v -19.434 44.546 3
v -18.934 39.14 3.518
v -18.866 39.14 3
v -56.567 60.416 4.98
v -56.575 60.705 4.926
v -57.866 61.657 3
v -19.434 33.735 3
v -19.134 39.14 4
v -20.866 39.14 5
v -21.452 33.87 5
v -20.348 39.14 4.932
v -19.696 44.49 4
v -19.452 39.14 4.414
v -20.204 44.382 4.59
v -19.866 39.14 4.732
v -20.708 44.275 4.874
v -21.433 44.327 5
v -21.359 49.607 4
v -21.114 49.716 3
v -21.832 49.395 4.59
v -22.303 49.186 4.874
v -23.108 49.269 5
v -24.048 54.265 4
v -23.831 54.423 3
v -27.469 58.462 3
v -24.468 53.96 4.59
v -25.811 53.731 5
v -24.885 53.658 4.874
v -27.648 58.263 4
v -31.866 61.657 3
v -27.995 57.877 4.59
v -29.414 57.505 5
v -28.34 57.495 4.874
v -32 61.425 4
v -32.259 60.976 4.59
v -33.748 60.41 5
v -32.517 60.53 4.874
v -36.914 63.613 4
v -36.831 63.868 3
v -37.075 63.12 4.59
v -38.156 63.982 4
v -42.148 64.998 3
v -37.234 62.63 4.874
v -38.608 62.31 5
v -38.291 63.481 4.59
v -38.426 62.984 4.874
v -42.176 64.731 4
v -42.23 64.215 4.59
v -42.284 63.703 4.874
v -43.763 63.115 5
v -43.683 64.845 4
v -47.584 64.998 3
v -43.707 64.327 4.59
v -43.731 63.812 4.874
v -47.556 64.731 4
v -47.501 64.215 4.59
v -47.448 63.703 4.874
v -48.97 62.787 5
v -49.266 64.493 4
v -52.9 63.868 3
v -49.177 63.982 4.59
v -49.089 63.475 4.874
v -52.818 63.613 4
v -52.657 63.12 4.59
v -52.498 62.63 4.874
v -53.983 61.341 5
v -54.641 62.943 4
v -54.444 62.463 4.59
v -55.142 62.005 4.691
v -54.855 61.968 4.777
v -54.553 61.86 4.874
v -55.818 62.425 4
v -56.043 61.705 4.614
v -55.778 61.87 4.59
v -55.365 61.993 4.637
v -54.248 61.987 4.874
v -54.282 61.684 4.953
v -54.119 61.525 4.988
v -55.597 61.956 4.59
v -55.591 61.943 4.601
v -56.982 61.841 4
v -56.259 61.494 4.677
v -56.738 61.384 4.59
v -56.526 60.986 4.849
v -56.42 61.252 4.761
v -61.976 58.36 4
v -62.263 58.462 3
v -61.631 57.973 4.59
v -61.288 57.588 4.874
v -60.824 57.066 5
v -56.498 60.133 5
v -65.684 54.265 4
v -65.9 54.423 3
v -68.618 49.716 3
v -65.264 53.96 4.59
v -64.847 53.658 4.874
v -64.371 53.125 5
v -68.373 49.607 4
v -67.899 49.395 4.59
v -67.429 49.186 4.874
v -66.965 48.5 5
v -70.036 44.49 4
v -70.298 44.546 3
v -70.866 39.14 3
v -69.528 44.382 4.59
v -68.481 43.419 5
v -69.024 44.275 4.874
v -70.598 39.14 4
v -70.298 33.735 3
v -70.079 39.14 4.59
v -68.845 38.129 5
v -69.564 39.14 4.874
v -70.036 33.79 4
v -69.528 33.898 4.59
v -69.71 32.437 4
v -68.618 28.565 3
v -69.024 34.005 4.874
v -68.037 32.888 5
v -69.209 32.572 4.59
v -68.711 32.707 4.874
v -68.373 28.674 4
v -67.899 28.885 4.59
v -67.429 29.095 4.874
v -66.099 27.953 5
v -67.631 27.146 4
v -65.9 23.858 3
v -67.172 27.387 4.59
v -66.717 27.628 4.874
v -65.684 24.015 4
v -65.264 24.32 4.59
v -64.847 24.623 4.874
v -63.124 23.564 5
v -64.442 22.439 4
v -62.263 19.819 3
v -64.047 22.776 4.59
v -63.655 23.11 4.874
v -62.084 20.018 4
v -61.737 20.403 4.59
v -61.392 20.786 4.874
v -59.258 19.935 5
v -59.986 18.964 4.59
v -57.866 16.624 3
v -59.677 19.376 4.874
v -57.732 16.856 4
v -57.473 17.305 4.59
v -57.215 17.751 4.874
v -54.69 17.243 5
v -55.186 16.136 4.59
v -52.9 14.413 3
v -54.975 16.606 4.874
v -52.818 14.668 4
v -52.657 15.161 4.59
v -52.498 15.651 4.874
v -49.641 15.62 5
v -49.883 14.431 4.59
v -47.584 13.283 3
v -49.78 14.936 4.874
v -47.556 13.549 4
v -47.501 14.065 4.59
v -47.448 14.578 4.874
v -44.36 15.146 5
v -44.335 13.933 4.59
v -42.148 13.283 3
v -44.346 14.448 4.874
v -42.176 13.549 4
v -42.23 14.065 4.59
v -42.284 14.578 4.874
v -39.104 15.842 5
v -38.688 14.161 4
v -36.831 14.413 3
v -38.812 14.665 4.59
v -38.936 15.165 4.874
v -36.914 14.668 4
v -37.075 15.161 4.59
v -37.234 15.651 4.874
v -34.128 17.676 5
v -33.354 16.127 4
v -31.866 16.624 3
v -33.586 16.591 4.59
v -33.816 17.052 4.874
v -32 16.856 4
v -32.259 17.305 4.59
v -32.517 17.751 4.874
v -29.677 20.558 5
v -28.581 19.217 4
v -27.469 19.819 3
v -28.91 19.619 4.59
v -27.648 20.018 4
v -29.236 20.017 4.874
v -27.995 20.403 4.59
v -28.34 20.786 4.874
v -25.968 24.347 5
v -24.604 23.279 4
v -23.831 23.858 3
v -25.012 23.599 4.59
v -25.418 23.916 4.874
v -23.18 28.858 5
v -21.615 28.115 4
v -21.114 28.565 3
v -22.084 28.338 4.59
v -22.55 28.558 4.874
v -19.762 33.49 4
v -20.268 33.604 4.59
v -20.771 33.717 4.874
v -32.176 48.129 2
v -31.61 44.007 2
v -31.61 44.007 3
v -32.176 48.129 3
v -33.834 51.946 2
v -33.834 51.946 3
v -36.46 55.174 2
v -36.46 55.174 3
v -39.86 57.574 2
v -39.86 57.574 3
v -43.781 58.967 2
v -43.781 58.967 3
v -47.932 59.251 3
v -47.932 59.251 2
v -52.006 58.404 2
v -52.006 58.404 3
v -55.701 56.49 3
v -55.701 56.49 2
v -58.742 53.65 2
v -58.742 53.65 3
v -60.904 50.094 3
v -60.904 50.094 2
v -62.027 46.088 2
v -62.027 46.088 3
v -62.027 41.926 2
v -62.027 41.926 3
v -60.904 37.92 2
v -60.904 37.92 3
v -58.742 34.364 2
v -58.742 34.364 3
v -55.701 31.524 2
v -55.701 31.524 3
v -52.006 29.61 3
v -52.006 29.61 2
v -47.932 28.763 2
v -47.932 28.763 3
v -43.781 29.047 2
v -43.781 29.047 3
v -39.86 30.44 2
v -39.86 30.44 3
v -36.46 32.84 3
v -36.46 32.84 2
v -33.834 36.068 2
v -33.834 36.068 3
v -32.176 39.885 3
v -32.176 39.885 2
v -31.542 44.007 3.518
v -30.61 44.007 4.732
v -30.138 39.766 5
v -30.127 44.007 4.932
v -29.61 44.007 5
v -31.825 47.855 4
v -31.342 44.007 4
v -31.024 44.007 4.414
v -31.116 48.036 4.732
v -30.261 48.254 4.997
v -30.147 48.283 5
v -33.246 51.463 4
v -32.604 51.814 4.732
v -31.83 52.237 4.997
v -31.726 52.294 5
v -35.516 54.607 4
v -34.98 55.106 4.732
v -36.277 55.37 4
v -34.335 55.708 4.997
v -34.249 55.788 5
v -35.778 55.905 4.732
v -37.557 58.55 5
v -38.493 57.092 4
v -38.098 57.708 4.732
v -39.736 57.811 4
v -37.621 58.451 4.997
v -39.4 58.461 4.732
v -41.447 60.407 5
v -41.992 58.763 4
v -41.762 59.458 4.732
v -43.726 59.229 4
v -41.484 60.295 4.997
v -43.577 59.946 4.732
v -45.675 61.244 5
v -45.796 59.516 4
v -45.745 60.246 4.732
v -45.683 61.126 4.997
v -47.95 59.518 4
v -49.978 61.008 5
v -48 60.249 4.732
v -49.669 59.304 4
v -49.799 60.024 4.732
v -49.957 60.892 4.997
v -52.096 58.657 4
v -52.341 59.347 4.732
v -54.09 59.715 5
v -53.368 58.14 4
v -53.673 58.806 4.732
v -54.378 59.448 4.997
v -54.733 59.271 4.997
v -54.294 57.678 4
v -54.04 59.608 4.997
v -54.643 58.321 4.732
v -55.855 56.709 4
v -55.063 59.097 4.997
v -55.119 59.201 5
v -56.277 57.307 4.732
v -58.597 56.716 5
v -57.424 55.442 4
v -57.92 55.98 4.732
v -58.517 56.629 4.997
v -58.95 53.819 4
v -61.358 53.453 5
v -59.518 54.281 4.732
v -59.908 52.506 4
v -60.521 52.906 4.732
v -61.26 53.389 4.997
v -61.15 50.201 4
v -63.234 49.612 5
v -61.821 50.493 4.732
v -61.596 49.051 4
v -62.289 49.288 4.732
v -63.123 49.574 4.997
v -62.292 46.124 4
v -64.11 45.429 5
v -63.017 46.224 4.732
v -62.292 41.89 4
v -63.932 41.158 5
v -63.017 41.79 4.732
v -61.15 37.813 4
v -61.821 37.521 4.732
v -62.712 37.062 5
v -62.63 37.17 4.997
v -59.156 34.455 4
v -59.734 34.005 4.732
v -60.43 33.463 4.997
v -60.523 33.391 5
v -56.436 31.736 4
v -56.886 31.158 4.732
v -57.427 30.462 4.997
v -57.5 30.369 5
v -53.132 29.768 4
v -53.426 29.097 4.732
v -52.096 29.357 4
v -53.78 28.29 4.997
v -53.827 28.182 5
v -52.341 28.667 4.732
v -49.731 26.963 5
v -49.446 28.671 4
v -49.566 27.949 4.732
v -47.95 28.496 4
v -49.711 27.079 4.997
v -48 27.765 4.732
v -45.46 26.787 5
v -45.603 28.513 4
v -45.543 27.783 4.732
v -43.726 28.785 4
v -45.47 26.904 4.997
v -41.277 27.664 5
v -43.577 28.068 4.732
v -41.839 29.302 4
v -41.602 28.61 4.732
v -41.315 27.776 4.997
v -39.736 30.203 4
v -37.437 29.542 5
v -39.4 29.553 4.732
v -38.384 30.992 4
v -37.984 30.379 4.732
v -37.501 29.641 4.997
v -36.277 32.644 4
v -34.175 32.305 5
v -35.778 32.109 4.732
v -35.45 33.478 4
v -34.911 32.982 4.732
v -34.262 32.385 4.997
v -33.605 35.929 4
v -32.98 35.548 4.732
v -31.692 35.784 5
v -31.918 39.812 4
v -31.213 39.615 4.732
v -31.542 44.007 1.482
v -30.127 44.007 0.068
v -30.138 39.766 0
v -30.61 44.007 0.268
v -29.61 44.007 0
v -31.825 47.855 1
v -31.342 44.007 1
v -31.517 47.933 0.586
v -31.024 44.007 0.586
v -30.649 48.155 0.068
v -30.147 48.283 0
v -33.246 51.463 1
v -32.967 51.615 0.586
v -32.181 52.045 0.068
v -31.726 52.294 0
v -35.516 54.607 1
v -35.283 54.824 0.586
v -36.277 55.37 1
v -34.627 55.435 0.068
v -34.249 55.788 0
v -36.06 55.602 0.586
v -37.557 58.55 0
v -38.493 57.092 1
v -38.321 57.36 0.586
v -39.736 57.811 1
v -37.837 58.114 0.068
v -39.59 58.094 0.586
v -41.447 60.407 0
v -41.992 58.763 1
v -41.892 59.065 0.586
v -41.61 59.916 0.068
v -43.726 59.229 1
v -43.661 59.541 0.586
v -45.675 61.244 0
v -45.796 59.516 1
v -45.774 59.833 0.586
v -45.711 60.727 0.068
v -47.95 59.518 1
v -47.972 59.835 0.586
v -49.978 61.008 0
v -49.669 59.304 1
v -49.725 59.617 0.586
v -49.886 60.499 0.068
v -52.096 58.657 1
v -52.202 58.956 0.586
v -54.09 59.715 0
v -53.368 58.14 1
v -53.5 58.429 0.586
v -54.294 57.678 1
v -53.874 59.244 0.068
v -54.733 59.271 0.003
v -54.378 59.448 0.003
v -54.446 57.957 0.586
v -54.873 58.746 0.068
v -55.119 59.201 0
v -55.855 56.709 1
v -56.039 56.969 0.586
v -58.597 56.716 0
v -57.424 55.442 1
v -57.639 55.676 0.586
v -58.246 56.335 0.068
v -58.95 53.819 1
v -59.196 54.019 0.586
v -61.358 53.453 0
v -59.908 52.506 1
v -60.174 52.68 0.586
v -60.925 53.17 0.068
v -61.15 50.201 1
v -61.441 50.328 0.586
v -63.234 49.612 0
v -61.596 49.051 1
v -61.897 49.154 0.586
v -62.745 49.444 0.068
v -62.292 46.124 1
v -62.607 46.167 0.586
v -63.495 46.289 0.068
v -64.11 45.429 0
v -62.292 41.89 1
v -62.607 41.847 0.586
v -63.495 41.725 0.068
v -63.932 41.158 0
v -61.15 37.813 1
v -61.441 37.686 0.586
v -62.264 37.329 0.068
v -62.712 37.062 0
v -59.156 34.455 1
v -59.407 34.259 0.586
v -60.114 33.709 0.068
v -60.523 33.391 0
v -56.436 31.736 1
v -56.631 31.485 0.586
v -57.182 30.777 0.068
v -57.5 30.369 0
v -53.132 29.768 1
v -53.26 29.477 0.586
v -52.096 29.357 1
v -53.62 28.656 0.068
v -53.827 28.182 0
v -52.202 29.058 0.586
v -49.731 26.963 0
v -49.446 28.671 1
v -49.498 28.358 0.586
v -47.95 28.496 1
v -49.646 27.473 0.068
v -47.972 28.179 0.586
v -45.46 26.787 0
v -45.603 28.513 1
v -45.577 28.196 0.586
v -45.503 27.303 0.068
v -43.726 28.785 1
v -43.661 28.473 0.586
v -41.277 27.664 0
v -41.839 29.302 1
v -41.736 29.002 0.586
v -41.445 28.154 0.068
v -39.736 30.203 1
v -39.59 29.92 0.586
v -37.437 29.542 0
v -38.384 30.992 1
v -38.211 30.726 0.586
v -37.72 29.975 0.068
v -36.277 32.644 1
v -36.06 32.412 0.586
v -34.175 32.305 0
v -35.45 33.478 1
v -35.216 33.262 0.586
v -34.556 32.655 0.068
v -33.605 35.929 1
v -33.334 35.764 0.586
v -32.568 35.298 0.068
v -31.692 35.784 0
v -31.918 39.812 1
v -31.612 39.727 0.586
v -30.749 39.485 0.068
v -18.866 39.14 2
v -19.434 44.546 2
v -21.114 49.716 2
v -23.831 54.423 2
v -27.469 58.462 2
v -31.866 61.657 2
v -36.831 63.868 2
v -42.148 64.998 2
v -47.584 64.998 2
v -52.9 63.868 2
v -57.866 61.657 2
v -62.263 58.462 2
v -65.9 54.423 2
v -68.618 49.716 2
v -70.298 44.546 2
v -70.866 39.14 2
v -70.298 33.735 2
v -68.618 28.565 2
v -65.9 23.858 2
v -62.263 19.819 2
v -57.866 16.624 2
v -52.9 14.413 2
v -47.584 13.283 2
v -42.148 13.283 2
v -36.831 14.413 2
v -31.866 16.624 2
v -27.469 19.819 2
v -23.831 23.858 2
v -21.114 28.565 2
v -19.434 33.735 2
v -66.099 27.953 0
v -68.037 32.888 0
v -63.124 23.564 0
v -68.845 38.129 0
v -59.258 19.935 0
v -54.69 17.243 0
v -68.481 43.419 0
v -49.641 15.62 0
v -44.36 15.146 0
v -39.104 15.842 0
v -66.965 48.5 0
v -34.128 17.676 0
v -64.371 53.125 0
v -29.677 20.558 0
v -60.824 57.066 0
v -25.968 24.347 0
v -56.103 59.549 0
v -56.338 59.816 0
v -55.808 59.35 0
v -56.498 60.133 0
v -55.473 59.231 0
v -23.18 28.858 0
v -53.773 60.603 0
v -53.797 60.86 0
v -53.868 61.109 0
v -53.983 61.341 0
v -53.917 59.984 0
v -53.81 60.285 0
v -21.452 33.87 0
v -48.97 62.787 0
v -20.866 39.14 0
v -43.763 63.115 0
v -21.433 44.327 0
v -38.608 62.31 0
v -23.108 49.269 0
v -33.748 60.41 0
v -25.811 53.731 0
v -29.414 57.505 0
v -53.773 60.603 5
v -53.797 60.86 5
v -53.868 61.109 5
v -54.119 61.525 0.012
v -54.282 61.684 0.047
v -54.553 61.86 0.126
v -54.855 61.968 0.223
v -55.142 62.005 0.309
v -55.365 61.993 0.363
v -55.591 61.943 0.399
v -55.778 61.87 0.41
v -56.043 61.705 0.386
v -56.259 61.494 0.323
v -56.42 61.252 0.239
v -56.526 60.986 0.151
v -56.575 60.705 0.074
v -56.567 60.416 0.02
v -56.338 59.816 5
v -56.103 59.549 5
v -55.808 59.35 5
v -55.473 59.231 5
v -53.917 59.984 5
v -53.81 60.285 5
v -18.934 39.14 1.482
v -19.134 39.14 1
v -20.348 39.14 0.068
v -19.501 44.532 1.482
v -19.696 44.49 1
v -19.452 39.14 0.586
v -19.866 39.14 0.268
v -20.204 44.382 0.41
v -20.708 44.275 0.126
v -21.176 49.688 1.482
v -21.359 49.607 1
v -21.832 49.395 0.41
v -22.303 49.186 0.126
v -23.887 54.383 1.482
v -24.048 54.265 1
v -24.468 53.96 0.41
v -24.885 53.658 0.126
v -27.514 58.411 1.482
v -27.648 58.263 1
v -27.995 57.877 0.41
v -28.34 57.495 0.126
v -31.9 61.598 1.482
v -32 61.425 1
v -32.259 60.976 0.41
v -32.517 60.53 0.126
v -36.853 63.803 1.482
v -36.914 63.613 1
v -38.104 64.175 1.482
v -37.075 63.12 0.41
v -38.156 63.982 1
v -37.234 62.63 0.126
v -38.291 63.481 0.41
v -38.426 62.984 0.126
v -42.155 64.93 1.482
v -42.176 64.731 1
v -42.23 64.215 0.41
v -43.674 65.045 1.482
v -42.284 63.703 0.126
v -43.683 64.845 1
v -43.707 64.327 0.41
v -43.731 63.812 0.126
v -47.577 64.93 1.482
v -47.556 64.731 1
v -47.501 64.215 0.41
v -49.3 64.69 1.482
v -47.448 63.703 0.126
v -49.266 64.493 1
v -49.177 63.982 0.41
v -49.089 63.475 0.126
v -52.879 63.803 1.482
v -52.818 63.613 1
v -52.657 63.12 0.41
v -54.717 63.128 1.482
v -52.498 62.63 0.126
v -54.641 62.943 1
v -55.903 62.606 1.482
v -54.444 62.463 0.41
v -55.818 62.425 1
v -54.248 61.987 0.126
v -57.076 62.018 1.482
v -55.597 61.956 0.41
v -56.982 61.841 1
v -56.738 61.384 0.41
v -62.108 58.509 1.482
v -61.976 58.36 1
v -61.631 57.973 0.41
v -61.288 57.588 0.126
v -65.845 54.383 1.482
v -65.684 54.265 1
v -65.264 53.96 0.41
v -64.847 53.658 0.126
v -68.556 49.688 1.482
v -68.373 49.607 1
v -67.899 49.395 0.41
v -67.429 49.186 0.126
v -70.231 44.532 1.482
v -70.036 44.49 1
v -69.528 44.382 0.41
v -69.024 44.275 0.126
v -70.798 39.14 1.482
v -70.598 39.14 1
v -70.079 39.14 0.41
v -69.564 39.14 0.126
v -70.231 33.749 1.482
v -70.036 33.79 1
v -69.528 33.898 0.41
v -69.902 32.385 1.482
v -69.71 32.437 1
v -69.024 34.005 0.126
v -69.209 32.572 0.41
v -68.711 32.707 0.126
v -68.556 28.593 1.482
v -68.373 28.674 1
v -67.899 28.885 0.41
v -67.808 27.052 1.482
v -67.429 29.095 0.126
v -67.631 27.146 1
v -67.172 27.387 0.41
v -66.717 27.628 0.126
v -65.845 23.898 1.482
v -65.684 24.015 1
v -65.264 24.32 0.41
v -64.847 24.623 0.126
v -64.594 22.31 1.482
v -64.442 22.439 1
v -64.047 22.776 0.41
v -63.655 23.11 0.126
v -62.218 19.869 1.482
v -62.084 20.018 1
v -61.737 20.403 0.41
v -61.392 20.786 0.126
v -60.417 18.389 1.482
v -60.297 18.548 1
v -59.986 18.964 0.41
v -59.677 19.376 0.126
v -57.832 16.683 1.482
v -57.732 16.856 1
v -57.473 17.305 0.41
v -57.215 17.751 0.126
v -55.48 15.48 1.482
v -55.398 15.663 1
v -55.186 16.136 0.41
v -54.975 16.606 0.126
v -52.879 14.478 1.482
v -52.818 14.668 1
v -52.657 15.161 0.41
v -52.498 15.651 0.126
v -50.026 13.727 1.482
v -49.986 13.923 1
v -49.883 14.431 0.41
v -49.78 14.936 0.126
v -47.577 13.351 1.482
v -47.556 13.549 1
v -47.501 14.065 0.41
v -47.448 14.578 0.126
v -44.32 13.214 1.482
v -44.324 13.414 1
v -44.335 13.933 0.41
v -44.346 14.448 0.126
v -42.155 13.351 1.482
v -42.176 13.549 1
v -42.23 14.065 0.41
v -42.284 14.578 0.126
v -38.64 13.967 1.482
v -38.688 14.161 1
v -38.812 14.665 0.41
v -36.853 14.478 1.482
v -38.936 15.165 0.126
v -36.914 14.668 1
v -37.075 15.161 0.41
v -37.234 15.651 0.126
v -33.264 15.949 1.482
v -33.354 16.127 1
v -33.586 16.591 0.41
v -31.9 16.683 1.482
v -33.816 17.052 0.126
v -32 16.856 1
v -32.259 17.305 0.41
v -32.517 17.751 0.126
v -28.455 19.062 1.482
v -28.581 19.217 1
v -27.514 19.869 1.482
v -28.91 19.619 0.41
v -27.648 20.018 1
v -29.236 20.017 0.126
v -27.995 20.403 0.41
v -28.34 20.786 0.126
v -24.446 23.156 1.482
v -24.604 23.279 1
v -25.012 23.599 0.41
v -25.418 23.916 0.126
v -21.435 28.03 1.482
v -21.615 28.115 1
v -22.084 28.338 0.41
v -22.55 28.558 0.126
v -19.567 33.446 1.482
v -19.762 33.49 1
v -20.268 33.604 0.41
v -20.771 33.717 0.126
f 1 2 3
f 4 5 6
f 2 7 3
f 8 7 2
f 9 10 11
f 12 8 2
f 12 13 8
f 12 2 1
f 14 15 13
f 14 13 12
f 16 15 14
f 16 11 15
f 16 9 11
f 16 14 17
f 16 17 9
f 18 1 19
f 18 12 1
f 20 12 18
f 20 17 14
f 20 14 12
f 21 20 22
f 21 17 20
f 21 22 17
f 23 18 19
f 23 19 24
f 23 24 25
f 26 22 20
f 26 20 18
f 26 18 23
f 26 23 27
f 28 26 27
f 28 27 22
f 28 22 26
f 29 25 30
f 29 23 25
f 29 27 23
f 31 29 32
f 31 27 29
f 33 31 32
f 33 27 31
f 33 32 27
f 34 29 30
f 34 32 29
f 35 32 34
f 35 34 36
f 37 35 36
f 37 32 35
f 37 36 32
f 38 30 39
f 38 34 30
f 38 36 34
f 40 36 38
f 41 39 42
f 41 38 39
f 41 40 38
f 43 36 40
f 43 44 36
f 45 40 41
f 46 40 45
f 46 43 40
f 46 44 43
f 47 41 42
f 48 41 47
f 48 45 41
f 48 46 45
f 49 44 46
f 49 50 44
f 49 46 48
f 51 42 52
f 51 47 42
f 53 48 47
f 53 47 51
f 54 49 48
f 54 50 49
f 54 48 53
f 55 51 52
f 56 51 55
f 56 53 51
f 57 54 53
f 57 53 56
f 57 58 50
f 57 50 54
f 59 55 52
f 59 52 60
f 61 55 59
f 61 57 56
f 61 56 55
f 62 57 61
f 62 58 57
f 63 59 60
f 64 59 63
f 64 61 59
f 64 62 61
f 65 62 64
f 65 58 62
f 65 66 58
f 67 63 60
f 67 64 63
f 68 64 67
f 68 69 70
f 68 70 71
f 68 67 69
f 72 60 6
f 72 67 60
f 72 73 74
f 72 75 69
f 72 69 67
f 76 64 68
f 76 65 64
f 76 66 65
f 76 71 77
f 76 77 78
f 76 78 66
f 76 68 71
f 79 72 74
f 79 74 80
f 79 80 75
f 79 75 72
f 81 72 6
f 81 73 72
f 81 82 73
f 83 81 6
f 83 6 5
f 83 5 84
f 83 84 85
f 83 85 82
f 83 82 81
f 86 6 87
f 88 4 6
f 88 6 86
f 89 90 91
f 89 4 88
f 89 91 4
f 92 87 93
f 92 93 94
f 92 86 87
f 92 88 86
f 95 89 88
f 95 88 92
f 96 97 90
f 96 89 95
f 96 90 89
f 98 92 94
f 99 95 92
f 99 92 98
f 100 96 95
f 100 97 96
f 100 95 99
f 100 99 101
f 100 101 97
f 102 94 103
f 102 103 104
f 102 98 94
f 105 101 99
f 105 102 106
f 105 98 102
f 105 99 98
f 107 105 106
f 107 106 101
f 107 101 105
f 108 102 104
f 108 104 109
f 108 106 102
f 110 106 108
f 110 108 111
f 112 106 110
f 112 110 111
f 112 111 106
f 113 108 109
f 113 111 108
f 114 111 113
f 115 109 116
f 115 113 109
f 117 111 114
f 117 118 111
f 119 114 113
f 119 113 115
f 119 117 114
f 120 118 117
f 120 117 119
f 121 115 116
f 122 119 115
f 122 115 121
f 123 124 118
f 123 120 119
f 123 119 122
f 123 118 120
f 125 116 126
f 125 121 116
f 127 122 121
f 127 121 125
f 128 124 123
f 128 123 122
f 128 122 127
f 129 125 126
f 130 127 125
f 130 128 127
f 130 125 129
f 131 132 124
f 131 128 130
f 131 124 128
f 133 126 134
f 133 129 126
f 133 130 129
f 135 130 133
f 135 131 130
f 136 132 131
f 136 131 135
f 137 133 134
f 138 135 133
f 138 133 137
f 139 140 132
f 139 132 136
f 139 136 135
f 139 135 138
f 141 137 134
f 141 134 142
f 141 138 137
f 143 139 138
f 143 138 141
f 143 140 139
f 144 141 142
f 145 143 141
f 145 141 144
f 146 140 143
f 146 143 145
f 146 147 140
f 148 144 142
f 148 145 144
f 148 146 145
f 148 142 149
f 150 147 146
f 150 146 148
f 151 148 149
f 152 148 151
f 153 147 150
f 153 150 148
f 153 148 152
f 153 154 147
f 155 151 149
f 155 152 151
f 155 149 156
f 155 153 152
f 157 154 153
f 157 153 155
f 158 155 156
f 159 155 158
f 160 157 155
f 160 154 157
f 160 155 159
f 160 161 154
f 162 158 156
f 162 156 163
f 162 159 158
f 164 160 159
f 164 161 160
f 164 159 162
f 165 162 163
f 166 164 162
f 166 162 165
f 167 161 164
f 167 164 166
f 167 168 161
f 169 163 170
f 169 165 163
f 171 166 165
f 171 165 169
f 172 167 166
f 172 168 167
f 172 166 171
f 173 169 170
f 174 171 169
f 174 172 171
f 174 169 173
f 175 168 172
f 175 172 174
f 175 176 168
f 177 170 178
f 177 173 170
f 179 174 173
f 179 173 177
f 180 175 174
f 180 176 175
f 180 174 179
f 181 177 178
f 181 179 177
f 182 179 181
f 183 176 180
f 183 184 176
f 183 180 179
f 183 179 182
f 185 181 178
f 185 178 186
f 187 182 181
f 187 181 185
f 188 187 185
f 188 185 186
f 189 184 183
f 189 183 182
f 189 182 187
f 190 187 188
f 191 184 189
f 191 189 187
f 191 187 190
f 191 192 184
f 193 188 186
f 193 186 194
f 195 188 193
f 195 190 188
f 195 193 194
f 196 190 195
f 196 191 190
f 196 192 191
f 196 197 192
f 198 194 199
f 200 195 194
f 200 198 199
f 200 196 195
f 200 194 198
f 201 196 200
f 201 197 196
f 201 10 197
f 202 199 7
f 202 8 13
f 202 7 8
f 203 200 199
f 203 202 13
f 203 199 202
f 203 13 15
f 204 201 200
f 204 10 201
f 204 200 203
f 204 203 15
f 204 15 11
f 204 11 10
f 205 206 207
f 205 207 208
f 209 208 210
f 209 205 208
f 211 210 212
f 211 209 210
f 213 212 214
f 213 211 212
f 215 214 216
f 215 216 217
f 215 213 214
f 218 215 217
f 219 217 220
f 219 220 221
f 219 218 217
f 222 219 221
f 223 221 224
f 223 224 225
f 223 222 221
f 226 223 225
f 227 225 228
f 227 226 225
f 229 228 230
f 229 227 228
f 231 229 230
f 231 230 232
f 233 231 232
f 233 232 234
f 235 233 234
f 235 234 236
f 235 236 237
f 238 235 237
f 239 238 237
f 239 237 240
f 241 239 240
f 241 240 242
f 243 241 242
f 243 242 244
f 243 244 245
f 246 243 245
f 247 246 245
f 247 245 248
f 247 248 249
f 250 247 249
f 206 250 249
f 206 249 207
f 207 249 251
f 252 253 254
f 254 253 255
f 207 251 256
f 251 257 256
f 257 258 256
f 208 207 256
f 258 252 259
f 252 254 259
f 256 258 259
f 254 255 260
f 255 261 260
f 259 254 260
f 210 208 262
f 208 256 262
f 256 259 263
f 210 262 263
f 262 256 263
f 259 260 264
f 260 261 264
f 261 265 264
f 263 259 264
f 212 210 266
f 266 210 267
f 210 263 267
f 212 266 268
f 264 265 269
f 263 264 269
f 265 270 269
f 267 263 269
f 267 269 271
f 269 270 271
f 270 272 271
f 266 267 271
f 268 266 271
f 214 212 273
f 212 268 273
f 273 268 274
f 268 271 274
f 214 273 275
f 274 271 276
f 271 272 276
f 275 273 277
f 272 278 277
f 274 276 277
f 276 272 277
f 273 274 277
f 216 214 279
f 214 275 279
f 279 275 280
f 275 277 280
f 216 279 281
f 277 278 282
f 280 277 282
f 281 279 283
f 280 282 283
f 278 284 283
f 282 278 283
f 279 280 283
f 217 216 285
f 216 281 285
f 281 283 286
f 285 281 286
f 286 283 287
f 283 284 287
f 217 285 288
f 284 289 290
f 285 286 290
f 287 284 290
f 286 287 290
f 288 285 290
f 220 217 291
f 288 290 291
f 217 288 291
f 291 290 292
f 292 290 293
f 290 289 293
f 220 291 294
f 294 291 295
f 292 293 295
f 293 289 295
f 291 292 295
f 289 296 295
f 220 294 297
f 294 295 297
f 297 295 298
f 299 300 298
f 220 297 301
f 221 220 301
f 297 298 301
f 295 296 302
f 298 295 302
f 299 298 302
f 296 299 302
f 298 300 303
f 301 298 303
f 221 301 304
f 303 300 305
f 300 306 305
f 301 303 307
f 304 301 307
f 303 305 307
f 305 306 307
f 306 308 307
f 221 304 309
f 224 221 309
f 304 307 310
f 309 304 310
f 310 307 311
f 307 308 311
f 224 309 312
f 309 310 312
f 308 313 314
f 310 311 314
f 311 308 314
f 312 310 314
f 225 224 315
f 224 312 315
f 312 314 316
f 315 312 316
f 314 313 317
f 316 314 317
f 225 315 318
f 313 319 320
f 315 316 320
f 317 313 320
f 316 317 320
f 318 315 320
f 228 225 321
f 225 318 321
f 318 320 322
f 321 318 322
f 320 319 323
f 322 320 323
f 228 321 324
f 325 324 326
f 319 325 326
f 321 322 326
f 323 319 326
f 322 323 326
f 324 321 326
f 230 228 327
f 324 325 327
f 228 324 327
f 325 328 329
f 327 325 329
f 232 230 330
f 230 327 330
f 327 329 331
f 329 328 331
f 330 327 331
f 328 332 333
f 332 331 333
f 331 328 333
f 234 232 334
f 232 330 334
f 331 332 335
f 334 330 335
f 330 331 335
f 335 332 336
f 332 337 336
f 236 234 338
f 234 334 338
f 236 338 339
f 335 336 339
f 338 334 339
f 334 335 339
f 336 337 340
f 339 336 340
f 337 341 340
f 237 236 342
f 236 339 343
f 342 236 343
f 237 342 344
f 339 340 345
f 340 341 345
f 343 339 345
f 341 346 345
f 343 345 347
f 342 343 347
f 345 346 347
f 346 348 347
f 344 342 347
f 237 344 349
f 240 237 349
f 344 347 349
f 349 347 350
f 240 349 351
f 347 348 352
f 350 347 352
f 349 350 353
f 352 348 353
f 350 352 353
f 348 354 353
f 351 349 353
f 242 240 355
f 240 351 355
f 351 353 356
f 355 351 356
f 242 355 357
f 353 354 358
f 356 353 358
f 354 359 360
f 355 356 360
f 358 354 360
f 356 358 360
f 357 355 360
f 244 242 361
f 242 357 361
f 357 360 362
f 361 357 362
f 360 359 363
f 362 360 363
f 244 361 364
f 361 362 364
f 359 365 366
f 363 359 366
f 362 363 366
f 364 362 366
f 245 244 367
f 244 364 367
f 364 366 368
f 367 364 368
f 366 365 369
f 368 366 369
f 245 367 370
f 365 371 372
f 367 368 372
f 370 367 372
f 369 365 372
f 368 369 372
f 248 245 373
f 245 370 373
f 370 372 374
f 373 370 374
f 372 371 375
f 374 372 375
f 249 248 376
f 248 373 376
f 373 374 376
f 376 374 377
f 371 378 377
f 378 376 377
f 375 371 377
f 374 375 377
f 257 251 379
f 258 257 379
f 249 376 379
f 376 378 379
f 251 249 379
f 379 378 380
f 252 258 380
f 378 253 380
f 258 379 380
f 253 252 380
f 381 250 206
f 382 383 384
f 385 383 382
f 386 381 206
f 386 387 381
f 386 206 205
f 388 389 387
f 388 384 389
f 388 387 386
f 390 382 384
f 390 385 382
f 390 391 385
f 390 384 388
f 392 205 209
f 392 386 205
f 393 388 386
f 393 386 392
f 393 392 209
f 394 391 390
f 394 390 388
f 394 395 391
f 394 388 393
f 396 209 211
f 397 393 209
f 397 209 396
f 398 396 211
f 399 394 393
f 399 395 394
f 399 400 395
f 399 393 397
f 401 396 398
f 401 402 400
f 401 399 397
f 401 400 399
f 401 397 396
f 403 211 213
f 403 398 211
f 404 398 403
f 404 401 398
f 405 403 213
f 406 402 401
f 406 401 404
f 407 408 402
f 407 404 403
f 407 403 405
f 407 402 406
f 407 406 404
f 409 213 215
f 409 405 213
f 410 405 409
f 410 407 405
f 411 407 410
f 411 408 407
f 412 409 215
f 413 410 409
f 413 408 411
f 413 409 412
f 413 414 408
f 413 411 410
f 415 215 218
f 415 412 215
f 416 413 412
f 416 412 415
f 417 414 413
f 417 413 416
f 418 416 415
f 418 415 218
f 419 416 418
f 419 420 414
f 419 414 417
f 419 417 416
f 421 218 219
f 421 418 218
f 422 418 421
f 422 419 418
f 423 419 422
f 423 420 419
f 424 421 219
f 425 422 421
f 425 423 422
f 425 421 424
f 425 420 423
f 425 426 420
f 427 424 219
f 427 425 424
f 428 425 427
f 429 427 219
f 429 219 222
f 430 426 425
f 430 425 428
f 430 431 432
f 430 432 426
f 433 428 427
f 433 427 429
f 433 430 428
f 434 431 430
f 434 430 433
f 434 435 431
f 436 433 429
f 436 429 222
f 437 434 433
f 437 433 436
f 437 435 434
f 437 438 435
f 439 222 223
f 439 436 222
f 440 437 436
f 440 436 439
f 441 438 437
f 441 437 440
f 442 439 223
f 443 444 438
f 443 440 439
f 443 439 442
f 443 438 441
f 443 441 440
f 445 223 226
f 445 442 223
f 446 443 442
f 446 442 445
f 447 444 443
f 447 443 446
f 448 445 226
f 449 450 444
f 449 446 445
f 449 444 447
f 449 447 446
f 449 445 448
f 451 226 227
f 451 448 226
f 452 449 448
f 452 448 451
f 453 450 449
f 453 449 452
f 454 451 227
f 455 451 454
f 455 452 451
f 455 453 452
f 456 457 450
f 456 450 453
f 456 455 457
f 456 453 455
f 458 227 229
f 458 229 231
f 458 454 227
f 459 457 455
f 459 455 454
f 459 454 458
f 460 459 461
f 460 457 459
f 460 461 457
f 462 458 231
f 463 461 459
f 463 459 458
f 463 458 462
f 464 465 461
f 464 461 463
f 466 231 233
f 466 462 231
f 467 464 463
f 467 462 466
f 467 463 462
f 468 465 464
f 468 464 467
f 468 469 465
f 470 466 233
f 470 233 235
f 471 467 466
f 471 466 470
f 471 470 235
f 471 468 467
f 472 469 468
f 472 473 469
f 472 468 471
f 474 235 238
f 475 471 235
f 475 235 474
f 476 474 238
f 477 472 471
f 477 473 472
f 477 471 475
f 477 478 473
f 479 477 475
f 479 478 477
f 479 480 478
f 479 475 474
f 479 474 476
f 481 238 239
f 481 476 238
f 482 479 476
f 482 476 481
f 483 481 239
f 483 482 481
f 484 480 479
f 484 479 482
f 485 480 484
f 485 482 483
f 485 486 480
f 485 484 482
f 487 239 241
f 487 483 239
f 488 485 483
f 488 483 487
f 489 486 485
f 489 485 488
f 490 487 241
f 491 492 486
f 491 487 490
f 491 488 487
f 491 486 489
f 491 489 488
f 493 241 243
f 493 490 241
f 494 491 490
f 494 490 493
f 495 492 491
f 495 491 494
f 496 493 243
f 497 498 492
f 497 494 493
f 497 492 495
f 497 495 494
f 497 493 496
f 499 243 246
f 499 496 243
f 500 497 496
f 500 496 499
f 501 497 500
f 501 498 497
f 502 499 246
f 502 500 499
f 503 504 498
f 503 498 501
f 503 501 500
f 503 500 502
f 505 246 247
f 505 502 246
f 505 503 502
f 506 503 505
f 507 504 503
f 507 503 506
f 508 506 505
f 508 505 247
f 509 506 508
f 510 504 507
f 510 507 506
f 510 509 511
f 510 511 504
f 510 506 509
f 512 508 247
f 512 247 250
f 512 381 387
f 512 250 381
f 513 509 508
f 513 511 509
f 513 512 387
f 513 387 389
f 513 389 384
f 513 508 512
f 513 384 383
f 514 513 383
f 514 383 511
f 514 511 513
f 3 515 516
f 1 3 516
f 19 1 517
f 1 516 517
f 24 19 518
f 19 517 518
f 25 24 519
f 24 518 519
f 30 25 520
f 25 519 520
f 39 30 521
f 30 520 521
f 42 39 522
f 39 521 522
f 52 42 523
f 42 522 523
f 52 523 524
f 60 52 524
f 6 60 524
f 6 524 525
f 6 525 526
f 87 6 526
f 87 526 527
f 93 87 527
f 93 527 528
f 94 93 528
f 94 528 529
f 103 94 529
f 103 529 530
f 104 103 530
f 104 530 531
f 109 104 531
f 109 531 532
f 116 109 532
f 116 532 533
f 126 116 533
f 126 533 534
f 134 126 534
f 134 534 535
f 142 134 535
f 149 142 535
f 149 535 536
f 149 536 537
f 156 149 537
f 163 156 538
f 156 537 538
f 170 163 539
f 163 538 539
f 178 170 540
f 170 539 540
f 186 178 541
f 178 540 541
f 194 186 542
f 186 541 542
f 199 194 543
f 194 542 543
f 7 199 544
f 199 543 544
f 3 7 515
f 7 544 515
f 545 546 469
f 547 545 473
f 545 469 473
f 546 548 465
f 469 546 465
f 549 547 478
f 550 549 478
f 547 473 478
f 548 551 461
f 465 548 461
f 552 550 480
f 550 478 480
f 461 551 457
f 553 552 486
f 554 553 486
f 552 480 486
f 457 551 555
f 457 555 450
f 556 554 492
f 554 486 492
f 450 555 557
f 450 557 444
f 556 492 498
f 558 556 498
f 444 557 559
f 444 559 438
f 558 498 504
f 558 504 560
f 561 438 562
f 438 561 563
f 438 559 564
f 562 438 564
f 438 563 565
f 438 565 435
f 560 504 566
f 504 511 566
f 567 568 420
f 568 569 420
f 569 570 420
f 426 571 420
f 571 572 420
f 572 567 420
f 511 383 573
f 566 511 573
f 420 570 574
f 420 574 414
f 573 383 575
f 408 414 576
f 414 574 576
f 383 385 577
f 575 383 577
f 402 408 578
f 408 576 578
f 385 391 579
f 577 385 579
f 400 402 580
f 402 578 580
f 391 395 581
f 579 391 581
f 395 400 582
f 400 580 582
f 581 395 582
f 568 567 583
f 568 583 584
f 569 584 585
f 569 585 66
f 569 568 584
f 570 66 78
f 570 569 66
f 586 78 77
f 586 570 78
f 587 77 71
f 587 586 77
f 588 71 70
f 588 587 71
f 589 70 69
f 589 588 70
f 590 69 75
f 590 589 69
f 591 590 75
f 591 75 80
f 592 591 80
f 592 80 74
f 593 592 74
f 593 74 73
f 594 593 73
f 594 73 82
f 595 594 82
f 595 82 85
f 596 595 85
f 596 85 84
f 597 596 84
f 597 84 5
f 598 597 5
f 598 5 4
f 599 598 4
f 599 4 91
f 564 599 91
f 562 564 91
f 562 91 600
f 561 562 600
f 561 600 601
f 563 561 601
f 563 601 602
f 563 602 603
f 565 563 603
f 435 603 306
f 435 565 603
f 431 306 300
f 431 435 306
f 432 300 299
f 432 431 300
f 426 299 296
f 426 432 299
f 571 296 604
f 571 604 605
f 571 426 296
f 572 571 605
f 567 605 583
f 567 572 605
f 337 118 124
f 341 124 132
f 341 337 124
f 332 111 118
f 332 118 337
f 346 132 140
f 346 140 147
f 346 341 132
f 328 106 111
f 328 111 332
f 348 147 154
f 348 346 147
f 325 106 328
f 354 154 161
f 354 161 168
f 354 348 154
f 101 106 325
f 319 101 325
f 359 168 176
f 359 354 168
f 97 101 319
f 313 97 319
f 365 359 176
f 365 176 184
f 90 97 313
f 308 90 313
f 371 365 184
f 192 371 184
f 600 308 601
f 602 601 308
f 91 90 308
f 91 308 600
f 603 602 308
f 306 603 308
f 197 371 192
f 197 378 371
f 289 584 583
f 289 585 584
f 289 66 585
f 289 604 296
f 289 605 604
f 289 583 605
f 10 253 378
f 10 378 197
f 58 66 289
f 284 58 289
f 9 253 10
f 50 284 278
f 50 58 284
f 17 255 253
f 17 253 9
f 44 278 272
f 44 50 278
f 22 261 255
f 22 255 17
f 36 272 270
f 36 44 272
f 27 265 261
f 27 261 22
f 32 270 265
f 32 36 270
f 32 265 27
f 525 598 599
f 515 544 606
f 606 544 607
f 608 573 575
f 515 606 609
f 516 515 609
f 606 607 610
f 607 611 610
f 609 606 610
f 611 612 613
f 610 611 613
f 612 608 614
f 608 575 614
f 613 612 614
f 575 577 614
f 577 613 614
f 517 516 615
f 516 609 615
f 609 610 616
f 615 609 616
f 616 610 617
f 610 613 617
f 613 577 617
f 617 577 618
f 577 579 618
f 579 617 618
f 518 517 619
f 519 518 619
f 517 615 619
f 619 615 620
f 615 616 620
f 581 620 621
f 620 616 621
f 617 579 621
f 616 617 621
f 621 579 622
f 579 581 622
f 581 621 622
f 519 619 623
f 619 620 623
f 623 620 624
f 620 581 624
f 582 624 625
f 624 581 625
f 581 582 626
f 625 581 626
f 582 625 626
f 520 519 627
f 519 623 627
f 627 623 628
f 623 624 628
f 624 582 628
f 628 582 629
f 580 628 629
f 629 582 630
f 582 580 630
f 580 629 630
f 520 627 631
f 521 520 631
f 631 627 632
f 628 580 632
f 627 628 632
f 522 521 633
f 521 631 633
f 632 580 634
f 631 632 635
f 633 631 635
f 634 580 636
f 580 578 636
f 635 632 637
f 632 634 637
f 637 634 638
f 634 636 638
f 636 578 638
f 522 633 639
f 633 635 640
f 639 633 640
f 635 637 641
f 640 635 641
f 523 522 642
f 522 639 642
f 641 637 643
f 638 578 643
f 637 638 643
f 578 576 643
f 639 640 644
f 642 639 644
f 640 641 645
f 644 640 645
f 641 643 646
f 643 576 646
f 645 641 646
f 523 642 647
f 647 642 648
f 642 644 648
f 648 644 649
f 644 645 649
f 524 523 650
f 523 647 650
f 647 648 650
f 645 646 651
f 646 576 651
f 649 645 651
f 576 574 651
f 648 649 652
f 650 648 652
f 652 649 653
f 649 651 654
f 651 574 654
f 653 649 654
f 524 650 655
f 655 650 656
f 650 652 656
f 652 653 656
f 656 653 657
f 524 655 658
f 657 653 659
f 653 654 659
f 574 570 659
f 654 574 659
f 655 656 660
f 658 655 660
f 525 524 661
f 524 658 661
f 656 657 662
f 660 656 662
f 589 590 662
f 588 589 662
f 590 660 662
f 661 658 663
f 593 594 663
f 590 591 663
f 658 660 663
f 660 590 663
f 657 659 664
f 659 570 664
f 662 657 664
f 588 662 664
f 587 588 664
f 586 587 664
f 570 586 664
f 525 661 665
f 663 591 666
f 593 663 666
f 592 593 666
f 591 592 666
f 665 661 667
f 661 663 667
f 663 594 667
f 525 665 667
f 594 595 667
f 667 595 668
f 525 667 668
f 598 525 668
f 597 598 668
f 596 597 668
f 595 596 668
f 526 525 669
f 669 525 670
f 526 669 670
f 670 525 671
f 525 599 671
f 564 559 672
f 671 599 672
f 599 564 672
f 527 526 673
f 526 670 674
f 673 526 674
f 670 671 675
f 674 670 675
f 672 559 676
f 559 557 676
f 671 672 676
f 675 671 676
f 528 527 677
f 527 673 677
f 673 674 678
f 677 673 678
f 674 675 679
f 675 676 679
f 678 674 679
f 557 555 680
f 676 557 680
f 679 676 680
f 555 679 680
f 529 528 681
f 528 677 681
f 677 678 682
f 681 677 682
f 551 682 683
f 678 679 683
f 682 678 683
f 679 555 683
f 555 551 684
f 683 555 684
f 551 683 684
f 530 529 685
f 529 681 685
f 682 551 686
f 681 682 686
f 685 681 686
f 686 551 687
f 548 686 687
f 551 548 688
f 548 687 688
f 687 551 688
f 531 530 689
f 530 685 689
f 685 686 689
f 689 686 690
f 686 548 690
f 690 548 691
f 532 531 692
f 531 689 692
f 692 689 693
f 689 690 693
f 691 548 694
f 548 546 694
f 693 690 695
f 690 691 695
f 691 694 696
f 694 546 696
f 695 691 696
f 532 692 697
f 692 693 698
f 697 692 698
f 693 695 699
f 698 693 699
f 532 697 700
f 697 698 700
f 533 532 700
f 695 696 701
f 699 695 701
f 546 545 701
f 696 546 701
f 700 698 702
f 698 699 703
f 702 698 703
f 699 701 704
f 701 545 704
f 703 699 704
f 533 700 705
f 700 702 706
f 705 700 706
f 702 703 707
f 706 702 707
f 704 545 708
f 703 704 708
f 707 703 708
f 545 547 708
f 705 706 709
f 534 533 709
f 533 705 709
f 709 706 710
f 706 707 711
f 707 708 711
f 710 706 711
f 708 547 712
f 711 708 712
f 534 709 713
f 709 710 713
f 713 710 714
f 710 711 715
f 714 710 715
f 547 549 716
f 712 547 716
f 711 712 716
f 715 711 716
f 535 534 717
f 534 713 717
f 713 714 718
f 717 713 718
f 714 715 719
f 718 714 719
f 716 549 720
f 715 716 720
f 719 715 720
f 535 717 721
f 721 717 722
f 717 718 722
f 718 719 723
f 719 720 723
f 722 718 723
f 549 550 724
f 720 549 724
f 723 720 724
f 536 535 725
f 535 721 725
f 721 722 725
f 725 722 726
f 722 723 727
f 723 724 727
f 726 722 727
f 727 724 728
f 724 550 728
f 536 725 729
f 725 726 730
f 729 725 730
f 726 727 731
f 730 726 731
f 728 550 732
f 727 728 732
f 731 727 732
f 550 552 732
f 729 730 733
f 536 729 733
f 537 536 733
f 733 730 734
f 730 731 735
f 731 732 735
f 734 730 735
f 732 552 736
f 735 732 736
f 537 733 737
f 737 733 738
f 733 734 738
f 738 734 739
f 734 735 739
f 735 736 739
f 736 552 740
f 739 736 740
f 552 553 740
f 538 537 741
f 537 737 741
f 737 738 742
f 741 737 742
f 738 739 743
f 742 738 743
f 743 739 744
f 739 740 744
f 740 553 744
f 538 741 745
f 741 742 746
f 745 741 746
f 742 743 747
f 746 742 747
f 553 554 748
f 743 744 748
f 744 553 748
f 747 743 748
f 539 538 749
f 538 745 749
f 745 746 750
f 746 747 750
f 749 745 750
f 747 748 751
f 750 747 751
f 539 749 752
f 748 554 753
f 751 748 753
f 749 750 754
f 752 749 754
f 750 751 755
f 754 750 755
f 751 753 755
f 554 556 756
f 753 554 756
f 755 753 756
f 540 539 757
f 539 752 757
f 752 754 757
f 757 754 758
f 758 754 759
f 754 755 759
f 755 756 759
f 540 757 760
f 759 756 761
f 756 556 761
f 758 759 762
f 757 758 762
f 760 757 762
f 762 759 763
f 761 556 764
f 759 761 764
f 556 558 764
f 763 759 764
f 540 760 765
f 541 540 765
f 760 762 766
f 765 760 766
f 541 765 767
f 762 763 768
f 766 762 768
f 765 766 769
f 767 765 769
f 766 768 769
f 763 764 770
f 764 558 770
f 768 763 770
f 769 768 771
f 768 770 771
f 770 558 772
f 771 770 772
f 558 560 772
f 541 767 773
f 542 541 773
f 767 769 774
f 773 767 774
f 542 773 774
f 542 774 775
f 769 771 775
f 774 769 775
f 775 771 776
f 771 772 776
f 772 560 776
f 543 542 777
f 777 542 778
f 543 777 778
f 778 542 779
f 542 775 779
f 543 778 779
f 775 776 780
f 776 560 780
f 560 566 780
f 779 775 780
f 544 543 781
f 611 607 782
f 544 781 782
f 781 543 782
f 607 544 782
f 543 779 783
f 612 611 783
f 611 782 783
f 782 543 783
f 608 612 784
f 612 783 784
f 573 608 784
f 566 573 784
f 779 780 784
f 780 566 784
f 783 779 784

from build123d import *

# Parameters (mm, degrees)
F0_R     = 26
F0_R_2   = 15.2795824113
F0_R_3   = 1.4029986266
F1_DEPTH = 5


# Not quite as in the source:
# - a fillet or chamfer that OpenCascade refuses, or shapes differently, is made with other operations: its cross-section is extruded or revolved along the edge and cut away or added


with BuildPart() as f1:
    # F0 (on Top) → F1 (new body)
    with BuildSketch(Plane.XY):
        with Locations((-44.8659136891, 39.1403473914)):
            Circle(F0_R)
        with Locations((-46.8892939389, 44.0070107579)):
            Circle(F0_R_2, mode=Mode.SUBTRACT)
        with Locations((-55.1761128008, 60.6025718153)):
            Circle(F0_R_3, mode=Mode.SUBTRACT)
    extrude(amount=F1_DEPTH)

    # F2: fillet of radius 2 on 4 edges, made by hand

    # F2_s1 → F2_t2 (revolve, cut)
    with BuildSketch(Plane.XZ.offset(-39.1403473914)):
        with BuildLine():
            ThreePointArc((-18.8659136891, 3), (-19.4517001268, 4.4142135624), (-20.8659136891, 5))
            Line((-20.8659136891, 5), (-18.8659136891, 5))
            Line((-18.8659136891, 5), (-18.8659136891, 3))
        make_face()
    revolve(axis=Axis((-44.8659136891, 39.1403473914, 5), (0, 0, 1)), mode=Mode.SUBTRACT)

    # F2_s3 → F2_t4 (revolve, cut)
    with BuildSketch(Plane.XZ.offset(-39.1403473914)):
        with BuildLine():
            ThreePointArc((-18.8659136891, 2), (-19.4517001268, 0.5857864376), (-20.8659136891, 0))
            Line((-20.8659136891, 0), (-18.8659136891, 0))
            Line((-18.8659136891, 0), (-18.8659136891, 2))
        make_face()
    revolve(axis=Axis((-44.8659136891, 39.1403473914, 0), (0, 0, 1)), mode=Mode.SUBTRACT)

    # F2_s5 → F2_t6 (revolve, cut)
    with BuildSketch(Plane.XZ.offset(-44.0070107579)):
        with BuildLine():
            ThreePointArc((-31.6097115275, 3), (-31.0239250899, 4.4142135624), (-29.6097115275, 5))
            Line((-29.6097115275, 5), (-31.6097115275, 5))
            Line((-31.6097115275, 5), (-31.6097115275, 3))
        make_face()
    revolve(axis=Axis((-46.8892939389, 44.0070107579, 5), (0, 0, 1)), mode=Mode.SUBTRACT)

    # F2_s7 → F2_t8 (revolve, cut)
    with BuildSketch(Plane.XZ.offset(-44.0070107579)):
        with BuildLine():
            ThreePointArc((-31.6097115275, 2), (-31.0239250899, 0.5857864376), (-29.6097115275, 0))
            Line((-29.6097115275, 0), (-31.6097115275, 0))
            Line((-31.6097115275, 0), (-31.6097115275, 2))
        make_face()
    revolve(axis=Axis((-46.8892939389, 44.0070107579, 0), (0, 0, 1)), mode=Mode.SUBTRACT)


solid = f1.part
